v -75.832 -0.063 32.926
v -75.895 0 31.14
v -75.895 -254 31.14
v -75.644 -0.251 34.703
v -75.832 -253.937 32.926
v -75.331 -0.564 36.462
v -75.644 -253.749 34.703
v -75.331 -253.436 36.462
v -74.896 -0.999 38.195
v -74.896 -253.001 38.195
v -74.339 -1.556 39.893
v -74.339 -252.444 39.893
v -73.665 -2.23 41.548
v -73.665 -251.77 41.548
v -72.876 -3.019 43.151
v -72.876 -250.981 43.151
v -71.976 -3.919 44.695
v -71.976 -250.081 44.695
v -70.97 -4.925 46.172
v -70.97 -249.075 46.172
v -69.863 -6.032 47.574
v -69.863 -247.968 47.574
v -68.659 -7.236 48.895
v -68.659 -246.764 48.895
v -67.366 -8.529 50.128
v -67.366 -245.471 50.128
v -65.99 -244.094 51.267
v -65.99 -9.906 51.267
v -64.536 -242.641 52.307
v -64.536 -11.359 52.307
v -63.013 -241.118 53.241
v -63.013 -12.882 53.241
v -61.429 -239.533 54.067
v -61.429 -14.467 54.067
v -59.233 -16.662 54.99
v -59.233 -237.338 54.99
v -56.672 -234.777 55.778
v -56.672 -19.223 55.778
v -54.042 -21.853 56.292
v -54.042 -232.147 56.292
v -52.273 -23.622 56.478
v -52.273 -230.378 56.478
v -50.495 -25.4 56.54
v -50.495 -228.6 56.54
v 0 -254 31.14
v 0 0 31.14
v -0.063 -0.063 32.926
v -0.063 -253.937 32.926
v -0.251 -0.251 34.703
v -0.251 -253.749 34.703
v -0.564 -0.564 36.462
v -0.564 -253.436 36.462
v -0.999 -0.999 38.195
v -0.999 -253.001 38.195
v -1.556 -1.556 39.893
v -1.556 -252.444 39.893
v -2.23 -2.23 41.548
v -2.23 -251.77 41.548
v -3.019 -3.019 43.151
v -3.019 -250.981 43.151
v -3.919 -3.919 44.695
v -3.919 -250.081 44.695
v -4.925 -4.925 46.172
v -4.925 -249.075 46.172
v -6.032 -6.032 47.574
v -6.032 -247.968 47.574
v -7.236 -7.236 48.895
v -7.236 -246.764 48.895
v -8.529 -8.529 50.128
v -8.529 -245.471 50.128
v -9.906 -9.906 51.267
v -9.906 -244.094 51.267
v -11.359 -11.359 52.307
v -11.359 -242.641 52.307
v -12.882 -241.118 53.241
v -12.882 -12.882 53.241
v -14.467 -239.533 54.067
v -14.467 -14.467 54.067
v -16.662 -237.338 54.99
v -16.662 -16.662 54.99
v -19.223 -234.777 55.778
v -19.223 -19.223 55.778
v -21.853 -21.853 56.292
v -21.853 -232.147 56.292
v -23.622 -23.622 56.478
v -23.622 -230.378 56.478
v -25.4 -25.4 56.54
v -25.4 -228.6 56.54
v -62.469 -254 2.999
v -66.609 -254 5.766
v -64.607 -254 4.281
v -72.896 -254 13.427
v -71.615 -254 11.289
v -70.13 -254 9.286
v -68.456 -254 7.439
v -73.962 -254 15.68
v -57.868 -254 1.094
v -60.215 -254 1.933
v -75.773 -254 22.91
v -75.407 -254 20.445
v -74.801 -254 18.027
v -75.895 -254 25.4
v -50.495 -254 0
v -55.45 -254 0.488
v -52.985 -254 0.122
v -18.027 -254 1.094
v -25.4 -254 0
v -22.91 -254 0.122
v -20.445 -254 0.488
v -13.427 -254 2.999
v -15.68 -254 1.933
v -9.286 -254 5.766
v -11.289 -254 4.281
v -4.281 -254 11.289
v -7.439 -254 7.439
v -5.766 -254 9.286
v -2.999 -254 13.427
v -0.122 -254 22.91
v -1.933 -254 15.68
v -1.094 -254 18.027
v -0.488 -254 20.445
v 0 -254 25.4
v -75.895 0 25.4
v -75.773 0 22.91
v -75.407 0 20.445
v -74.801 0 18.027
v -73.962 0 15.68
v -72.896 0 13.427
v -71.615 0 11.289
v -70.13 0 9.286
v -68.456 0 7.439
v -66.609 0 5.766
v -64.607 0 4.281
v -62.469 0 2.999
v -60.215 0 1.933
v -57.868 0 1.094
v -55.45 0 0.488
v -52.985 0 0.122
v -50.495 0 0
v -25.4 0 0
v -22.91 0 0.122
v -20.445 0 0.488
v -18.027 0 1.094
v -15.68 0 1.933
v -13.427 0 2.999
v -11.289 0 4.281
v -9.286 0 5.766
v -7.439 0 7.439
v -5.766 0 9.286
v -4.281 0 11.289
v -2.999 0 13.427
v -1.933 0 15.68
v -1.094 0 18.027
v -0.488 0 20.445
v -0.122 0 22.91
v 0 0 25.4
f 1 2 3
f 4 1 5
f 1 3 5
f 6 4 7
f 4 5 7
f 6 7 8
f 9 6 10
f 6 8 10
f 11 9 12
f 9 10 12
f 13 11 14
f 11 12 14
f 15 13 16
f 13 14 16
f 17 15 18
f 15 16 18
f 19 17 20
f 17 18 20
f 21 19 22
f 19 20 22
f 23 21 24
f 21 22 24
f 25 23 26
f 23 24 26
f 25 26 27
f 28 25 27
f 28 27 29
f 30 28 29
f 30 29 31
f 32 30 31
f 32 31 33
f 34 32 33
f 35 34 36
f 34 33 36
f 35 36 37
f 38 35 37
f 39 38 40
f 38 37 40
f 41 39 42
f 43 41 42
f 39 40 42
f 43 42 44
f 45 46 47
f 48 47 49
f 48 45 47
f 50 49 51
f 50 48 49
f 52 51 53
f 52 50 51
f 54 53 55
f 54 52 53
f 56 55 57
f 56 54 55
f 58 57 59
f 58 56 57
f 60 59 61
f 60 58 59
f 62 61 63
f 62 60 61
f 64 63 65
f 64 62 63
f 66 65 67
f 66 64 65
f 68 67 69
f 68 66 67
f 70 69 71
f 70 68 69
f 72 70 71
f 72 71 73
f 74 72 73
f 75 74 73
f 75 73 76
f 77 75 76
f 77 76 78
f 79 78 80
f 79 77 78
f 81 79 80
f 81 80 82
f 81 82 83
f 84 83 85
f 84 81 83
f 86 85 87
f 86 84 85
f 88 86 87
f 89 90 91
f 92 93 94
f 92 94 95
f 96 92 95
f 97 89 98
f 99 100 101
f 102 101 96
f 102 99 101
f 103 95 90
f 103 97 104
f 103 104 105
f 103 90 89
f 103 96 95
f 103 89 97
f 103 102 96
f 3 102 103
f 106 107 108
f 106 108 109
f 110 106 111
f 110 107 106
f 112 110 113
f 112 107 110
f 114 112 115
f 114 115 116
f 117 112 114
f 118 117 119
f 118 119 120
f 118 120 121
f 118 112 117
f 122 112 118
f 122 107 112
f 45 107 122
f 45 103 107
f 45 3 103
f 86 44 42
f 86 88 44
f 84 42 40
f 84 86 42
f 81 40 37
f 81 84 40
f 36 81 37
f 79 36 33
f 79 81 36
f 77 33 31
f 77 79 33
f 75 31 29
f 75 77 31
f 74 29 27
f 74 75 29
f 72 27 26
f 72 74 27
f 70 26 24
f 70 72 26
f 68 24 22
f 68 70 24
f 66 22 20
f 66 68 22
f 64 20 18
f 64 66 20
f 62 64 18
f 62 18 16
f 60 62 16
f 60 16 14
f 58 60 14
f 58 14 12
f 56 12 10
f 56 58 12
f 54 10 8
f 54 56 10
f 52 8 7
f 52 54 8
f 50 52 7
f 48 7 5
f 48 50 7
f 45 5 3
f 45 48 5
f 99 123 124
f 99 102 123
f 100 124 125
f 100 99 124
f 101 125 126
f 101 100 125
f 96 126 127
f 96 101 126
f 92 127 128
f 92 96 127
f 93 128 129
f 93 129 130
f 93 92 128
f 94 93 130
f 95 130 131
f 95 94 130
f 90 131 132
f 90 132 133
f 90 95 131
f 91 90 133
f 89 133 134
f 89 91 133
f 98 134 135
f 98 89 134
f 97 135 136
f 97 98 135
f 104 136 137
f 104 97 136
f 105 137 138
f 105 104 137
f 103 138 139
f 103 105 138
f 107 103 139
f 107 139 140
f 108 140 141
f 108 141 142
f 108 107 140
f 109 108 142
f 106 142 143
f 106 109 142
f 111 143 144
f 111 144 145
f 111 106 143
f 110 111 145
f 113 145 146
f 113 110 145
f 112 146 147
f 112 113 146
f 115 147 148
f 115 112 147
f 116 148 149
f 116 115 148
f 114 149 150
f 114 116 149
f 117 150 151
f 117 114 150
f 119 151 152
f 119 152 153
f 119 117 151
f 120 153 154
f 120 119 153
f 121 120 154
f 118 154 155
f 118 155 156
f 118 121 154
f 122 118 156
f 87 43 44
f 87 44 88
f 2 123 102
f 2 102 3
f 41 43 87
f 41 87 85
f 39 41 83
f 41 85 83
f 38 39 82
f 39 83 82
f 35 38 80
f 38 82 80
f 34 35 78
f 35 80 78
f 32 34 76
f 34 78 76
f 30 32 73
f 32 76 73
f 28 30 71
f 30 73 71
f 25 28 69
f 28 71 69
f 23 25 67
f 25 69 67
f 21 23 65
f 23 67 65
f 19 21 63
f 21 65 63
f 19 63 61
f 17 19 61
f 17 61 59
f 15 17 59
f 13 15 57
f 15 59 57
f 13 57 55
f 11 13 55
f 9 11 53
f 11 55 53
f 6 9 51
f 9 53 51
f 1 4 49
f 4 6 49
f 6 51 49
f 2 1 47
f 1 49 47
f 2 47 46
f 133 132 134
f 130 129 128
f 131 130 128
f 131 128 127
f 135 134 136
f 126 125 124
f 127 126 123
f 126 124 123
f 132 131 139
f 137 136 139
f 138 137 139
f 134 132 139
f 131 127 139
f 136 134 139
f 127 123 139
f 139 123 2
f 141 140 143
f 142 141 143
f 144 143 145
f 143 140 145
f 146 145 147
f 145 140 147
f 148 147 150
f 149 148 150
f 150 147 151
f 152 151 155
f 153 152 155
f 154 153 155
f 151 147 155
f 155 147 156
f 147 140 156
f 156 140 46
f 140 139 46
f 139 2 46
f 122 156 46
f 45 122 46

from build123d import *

# Parameters (mm, degrees)
F0_W     = 75.895198
F0_H     = 56.5404
F1_DEPTH = 254
F2_R     = 25.4


with BuildPart() as f1:
    # F0 (on Front) → F1 (new body)
    with BuildSketch(Plane.XZ):
        with Locations((-37.947599, 28.2702)):
            Rectangle(F0_W, F0_H)
    extrude(amount=F1_DEPTH)

    # F2
    f2_edges = [f1.edges().sort_by_distance(p)[0] for p in [
        (0, -127, 56.5404),
        (0, -127, 0),
        (-75.895198, -127, 56.5404),
        (-37.947599, 0, 56.5404),
        (-37.947599, -254, 56.5404),
        (-75.895198, -127, 0),
    ]]
    fillet(f2_edges, radius=F2_R)


solid = f1.part
